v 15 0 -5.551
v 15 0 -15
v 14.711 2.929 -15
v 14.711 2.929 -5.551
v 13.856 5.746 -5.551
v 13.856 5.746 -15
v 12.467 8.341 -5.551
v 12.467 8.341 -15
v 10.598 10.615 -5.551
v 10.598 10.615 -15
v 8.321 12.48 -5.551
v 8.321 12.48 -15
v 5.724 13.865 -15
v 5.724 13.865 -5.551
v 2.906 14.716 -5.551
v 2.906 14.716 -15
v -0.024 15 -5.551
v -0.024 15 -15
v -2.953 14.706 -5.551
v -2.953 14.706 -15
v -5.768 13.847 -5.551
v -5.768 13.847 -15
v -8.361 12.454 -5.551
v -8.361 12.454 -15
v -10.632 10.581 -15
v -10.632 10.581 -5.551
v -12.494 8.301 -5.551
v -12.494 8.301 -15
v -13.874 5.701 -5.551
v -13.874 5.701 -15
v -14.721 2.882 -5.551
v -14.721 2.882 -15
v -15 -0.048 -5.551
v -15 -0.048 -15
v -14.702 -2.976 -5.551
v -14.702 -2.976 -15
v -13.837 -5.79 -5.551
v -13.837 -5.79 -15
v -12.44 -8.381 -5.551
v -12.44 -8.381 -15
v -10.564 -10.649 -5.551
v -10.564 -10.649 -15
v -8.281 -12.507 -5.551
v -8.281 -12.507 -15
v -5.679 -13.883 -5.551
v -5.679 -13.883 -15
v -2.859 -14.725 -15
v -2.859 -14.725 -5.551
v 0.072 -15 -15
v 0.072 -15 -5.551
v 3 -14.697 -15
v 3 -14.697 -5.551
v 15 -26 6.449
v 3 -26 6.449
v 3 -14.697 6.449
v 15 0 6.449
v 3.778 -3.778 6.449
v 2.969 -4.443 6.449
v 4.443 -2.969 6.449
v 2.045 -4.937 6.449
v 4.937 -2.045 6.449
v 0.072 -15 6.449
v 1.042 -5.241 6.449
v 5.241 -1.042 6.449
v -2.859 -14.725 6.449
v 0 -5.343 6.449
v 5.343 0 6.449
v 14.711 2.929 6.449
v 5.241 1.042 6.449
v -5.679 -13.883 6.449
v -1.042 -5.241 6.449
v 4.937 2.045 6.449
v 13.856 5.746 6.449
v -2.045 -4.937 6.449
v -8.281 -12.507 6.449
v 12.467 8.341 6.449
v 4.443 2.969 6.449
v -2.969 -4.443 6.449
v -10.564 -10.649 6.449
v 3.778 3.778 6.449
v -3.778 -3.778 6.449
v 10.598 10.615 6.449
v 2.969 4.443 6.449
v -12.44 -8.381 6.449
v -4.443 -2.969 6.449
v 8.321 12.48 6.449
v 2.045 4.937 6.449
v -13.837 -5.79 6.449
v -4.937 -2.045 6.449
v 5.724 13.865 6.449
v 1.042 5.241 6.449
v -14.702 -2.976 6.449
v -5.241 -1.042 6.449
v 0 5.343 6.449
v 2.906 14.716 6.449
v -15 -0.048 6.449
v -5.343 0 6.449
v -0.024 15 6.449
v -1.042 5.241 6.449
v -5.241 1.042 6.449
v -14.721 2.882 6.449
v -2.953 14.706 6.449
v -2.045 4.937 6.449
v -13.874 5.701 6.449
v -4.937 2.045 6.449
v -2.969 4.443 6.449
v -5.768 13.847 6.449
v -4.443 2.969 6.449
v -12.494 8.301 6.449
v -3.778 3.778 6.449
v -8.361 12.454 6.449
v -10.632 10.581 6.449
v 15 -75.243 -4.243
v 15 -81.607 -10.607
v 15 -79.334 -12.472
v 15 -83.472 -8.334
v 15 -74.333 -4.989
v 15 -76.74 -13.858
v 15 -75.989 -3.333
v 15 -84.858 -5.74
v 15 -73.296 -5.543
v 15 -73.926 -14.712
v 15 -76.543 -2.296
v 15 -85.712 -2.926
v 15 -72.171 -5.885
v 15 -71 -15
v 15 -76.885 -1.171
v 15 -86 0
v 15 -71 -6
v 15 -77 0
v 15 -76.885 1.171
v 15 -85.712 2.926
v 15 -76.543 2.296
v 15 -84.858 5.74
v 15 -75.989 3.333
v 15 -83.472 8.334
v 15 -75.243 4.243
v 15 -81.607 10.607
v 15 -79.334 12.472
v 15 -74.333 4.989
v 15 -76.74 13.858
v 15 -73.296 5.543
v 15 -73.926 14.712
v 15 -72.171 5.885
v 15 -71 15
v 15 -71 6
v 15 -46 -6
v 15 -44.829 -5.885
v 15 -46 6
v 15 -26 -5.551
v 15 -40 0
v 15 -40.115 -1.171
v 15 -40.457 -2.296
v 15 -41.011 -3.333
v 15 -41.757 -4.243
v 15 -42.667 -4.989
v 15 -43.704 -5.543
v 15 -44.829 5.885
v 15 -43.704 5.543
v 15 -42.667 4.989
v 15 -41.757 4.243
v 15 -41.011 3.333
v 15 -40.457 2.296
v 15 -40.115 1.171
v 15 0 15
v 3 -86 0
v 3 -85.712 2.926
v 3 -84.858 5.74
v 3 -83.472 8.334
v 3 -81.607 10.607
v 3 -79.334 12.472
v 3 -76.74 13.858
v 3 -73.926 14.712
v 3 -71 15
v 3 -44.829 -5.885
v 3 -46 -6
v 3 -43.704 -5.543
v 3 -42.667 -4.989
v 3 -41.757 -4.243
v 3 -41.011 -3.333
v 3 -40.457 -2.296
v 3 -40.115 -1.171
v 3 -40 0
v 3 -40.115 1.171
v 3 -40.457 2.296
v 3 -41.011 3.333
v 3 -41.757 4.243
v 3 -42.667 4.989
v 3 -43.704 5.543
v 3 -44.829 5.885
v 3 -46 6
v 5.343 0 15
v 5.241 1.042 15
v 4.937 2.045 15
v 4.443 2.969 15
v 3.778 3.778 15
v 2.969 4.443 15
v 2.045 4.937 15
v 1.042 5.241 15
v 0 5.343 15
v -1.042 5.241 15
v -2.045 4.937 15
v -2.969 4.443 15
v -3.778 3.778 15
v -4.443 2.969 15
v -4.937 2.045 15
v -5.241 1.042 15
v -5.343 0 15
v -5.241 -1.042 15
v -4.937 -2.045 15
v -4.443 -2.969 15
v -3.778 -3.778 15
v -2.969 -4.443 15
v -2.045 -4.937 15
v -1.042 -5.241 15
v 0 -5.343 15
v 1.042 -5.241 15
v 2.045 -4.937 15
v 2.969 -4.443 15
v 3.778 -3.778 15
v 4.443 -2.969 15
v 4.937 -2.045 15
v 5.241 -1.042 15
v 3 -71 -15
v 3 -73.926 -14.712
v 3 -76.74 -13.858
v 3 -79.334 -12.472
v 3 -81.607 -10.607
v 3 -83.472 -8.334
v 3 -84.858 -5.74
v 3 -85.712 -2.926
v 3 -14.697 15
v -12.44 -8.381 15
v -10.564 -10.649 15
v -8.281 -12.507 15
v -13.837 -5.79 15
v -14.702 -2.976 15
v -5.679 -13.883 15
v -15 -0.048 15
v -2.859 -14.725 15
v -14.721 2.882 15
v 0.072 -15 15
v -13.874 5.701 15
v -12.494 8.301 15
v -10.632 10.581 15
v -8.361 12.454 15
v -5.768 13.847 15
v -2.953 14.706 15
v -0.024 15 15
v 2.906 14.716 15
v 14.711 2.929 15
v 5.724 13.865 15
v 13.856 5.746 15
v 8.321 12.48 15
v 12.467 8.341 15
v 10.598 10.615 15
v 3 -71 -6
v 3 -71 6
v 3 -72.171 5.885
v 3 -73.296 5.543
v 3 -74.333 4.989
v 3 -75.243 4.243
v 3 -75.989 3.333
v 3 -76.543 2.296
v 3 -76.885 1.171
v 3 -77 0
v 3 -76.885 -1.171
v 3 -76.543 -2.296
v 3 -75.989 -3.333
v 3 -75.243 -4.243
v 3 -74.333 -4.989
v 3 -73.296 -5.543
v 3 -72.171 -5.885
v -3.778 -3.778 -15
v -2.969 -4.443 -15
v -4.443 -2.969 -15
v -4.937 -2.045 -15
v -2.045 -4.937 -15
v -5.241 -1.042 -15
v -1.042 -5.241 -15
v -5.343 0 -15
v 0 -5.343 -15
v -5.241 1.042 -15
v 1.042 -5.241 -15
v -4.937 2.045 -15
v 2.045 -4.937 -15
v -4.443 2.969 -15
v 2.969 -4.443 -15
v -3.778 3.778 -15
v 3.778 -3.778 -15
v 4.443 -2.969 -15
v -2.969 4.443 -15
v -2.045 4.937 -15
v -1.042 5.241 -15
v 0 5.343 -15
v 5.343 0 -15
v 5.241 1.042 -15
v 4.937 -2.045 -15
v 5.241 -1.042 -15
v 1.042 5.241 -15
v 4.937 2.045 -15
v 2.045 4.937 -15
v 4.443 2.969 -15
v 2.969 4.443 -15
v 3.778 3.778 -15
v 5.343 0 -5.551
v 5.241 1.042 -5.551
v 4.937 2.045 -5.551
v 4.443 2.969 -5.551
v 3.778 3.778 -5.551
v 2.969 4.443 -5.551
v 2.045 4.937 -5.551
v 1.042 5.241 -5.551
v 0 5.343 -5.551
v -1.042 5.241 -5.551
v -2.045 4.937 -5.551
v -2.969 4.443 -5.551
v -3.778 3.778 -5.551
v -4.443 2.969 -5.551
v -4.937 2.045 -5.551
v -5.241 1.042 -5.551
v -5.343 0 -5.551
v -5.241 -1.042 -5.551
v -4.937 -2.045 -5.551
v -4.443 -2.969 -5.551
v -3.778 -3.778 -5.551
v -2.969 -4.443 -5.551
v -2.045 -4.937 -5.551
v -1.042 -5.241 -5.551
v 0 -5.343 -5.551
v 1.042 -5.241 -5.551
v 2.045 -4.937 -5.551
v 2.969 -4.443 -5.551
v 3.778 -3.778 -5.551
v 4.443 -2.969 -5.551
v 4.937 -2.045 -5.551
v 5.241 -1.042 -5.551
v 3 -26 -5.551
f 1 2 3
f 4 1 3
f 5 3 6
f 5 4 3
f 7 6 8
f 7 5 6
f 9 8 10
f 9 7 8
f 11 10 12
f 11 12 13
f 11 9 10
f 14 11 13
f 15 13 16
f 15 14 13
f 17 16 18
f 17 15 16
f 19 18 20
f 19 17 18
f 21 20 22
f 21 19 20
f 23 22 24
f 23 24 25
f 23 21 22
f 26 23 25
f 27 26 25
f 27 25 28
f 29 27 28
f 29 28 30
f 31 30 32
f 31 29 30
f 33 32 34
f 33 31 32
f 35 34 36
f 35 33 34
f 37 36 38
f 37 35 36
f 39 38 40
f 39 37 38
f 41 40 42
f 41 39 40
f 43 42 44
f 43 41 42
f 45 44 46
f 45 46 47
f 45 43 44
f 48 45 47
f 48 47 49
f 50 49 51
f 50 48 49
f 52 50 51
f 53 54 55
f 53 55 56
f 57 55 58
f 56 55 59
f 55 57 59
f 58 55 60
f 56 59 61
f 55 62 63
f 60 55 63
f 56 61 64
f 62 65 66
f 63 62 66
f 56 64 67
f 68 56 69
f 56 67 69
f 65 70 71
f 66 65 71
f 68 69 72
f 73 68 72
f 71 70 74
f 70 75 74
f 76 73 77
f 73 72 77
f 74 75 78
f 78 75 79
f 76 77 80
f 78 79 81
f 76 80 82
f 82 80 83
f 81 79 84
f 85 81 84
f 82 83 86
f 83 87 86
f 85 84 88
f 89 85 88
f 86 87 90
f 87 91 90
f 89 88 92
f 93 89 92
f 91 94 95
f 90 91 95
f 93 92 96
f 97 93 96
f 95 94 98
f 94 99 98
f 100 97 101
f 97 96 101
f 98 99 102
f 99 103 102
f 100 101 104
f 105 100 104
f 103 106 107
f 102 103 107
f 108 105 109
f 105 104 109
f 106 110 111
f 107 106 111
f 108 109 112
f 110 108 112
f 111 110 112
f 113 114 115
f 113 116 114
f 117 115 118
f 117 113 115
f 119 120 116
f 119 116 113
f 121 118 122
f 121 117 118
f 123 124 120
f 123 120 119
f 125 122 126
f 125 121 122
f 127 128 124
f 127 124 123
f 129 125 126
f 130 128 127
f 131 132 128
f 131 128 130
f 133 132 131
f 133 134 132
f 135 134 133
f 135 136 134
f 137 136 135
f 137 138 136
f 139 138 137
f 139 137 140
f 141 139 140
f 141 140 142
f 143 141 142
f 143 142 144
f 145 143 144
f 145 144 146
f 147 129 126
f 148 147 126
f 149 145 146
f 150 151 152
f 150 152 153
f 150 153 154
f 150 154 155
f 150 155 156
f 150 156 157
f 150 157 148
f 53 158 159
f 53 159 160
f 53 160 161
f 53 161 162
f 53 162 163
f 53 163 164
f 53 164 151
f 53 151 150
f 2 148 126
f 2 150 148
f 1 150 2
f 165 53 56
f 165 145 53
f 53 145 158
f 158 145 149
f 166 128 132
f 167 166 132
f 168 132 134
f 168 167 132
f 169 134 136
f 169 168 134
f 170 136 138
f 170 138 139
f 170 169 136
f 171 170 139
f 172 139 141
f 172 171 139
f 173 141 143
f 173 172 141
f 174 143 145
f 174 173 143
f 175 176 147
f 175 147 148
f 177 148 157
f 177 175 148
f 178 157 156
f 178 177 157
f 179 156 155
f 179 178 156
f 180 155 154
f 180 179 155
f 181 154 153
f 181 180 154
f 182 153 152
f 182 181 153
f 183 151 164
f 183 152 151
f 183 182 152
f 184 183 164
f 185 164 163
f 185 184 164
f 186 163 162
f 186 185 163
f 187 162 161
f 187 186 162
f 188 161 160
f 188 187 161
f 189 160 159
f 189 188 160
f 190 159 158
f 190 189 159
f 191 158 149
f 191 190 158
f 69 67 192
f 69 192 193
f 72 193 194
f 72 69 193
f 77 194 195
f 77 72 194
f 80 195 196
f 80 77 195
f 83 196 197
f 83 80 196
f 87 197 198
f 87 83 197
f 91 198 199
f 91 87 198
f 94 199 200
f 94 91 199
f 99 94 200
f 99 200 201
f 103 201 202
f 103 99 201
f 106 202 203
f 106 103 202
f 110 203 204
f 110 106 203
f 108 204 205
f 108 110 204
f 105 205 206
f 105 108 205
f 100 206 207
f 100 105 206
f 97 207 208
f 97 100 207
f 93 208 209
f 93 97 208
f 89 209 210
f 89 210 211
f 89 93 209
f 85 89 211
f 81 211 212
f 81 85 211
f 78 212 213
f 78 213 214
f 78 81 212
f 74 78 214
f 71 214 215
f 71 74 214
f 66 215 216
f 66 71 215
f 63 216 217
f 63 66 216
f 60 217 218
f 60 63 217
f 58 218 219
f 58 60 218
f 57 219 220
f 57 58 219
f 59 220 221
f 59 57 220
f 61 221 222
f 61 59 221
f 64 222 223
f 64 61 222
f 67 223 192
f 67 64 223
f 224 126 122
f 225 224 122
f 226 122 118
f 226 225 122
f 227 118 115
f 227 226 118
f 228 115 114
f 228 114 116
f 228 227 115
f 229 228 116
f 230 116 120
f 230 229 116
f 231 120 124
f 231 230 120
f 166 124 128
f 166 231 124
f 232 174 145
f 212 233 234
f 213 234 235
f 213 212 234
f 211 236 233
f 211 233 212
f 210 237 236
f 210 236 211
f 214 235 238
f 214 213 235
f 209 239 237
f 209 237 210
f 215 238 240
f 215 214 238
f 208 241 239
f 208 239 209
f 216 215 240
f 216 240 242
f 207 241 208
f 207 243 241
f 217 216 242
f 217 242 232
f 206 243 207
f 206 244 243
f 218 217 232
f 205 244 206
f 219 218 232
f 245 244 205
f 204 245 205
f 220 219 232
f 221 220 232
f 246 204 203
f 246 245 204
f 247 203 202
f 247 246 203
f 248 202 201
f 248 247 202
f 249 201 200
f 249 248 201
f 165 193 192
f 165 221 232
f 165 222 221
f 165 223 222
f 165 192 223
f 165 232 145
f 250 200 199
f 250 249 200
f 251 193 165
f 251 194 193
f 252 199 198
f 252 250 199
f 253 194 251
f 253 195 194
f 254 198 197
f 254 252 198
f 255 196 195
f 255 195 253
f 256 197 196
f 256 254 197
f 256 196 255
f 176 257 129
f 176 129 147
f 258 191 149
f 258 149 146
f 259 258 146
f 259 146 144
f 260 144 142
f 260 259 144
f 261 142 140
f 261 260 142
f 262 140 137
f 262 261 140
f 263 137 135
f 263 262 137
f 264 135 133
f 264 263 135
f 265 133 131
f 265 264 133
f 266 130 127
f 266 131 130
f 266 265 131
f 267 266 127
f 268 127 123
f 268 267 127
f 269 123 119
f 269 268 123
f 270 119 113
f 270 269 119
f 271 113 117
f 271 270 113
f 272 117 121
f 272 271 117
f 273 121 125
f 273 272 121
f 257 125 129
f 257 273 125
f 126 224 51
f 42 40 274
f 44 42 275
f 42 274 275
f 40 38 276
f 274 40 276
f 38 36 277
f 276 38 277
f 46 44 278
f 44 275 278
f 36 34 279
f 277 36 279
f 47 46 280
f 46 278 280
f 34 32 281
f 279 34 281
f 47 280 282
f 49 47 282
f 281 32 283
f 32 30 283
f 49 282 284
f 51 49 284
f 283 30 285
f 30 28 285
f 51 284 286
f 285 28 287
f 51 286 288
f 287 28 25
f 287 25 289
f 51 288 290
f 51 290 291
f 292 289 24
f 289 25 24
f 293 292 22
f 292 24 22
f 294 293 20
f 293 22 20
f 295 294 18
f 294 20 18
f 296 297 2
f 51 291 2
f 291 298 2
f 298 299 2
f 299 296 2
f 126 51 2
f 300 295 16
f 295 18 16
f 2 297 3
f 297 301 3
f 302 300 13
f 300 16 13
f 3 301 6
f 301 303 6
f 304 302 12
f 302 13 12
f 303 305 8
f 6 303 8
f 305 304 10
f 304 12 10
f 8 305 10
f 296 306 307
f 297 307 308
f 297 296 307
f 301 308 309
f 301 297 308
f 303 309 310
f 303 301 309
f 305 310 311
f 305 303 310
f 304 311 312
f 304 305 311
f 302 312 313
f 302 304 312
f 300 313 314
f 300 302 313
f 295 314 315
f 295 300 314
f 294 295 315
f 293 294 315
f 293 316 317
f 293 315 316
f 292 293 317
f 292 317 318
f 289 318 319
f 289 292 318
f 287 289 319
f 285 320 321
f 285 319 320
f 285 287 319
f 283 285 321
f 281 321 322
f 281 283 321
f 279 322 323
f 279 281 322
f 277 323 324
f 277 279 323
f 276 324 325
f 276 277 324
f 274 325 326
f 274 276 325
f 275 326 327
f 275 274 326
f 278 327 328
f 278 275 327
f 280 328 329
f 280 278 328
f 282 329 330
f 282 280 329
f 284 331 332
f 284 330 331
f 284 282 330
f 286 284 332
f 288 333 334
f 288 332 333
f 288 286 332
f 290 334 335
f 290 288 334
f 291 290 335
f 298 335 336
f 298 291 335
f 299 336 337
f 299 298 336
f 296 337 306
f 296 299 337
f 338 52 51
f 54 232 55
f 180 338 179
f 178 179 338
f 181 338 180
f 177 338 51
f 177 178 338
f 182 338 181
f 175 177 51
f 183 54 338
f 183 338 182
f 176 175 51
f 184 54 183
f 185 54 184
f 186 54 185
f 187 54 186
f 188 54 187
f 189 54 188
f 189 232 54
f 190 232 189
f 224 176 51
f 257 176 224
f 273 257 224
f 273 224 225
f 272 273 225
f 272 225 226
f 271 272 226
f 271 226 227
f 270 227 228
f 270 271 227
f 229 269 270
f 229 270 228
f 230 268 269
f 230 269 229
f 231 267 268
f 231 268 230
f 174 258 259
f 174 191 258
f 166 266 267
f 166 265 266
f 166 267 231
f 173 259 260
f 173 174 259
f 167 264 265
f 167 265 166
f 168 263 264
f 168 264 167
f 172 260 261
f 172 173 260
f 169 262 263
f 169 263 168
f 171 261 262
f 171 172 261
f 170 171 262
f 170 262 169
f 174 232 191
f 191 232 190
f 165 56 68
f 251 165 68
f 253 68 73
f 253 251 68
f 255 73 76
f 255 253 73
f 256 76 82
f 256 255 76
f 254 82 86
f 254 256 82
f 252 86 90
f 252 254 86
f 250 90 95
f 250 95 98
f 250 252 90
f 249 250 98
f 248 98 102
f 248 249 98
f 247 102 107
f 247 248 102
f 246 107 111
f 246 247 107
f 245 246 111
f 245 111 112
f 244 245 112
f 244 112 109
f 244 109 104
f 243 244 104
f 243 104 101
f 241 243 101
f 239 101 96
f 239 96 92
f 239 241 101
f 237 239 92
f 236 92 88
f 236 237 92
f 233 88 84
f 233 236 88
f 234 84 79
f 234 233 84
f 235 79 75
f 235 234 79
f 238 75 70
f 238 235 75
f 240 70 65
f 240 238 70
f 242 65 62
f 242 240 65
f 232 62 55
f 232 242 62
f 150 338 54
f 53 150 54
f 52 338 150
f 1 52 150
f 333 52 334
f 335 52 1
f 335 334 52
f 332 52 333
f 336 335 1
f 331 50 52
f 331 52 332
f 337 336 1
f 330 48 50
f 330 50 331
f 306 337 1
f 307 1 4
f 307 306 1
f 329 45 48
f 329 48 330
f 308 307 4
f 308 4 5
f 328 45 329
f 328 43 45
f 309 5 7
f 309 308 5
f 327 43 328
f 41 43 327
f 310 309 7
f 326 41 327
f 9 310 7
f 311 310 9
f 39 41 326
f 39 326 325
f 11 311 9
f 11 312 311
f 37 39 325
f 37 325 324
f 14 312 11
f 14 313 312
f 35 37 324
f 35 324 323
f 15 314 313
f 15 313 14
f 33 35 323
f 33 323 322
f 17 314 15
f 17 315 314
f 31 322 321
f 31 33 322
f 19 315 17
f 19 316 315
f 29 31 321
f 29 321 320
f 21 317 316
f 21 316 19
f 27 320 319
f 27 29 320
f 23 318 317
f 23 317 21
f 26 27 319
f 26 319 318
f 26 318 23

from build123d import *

# Parameters (mm, degrees)
F0_R     = 5.343381
F1_DEPTH = 15
F3_W     = 41
F3_H     = 12
F4_DEPTH = 62.101


with BuildPart() as f1:
    # F0 (on Top) → F1 (new body, symmetric)
    with BuildSketch(Plane.XY):
        with BuildLine():
            Line((15, -86), (15, 0))
            ThreePointArc((15, 0), (-11.61895, 9.486833), (3, -14.696938))
            Line((3, -14.696938), (3, -86))
            Line((3, -86), (15, -86))
        make_face()
        Circle(F0_R, mode=Mode.SUBTRACT)
    extrude(amount=F1_DEPTH, both=True)

    # F3 (on offset) → F4 (cut, through all)
    with BuildSketch(Plane.YZ.offset(-47.1)):
        with Locations((-5.5, 0.449385)):
            Rectangle(F3_W, F3_H)
        with BuildLine():
            Line((-71, -6), (-46, -6))
            ThreePointArc((-46, -6), (-40, 0), (-46, 6))
            Line((-46, 6), (-71, 6))
            ThreePointArc((-71, 6), (-77, 0), (-71, -6))
        make_face()
        with BuildLine():
            Line((-86, -15), (-71, -15))
            ThreePointArc((-71, -15), (-81.606602, -10.606602), (-86, 0))
            Line((-86, 0), (-86, -15))
        make_face()
        with BuildLine():
            Line((-86, 15), (-86, 0))
            ThreePointArc((-86, 0), (-81.606602, 10.606602), (-71, 15))
            Line((-71, 15), (-86, 15))
        make_face()
    extrude(amount=F4_DEPTH, mode=Mode.SUBTRACT)


solid = f1.part
